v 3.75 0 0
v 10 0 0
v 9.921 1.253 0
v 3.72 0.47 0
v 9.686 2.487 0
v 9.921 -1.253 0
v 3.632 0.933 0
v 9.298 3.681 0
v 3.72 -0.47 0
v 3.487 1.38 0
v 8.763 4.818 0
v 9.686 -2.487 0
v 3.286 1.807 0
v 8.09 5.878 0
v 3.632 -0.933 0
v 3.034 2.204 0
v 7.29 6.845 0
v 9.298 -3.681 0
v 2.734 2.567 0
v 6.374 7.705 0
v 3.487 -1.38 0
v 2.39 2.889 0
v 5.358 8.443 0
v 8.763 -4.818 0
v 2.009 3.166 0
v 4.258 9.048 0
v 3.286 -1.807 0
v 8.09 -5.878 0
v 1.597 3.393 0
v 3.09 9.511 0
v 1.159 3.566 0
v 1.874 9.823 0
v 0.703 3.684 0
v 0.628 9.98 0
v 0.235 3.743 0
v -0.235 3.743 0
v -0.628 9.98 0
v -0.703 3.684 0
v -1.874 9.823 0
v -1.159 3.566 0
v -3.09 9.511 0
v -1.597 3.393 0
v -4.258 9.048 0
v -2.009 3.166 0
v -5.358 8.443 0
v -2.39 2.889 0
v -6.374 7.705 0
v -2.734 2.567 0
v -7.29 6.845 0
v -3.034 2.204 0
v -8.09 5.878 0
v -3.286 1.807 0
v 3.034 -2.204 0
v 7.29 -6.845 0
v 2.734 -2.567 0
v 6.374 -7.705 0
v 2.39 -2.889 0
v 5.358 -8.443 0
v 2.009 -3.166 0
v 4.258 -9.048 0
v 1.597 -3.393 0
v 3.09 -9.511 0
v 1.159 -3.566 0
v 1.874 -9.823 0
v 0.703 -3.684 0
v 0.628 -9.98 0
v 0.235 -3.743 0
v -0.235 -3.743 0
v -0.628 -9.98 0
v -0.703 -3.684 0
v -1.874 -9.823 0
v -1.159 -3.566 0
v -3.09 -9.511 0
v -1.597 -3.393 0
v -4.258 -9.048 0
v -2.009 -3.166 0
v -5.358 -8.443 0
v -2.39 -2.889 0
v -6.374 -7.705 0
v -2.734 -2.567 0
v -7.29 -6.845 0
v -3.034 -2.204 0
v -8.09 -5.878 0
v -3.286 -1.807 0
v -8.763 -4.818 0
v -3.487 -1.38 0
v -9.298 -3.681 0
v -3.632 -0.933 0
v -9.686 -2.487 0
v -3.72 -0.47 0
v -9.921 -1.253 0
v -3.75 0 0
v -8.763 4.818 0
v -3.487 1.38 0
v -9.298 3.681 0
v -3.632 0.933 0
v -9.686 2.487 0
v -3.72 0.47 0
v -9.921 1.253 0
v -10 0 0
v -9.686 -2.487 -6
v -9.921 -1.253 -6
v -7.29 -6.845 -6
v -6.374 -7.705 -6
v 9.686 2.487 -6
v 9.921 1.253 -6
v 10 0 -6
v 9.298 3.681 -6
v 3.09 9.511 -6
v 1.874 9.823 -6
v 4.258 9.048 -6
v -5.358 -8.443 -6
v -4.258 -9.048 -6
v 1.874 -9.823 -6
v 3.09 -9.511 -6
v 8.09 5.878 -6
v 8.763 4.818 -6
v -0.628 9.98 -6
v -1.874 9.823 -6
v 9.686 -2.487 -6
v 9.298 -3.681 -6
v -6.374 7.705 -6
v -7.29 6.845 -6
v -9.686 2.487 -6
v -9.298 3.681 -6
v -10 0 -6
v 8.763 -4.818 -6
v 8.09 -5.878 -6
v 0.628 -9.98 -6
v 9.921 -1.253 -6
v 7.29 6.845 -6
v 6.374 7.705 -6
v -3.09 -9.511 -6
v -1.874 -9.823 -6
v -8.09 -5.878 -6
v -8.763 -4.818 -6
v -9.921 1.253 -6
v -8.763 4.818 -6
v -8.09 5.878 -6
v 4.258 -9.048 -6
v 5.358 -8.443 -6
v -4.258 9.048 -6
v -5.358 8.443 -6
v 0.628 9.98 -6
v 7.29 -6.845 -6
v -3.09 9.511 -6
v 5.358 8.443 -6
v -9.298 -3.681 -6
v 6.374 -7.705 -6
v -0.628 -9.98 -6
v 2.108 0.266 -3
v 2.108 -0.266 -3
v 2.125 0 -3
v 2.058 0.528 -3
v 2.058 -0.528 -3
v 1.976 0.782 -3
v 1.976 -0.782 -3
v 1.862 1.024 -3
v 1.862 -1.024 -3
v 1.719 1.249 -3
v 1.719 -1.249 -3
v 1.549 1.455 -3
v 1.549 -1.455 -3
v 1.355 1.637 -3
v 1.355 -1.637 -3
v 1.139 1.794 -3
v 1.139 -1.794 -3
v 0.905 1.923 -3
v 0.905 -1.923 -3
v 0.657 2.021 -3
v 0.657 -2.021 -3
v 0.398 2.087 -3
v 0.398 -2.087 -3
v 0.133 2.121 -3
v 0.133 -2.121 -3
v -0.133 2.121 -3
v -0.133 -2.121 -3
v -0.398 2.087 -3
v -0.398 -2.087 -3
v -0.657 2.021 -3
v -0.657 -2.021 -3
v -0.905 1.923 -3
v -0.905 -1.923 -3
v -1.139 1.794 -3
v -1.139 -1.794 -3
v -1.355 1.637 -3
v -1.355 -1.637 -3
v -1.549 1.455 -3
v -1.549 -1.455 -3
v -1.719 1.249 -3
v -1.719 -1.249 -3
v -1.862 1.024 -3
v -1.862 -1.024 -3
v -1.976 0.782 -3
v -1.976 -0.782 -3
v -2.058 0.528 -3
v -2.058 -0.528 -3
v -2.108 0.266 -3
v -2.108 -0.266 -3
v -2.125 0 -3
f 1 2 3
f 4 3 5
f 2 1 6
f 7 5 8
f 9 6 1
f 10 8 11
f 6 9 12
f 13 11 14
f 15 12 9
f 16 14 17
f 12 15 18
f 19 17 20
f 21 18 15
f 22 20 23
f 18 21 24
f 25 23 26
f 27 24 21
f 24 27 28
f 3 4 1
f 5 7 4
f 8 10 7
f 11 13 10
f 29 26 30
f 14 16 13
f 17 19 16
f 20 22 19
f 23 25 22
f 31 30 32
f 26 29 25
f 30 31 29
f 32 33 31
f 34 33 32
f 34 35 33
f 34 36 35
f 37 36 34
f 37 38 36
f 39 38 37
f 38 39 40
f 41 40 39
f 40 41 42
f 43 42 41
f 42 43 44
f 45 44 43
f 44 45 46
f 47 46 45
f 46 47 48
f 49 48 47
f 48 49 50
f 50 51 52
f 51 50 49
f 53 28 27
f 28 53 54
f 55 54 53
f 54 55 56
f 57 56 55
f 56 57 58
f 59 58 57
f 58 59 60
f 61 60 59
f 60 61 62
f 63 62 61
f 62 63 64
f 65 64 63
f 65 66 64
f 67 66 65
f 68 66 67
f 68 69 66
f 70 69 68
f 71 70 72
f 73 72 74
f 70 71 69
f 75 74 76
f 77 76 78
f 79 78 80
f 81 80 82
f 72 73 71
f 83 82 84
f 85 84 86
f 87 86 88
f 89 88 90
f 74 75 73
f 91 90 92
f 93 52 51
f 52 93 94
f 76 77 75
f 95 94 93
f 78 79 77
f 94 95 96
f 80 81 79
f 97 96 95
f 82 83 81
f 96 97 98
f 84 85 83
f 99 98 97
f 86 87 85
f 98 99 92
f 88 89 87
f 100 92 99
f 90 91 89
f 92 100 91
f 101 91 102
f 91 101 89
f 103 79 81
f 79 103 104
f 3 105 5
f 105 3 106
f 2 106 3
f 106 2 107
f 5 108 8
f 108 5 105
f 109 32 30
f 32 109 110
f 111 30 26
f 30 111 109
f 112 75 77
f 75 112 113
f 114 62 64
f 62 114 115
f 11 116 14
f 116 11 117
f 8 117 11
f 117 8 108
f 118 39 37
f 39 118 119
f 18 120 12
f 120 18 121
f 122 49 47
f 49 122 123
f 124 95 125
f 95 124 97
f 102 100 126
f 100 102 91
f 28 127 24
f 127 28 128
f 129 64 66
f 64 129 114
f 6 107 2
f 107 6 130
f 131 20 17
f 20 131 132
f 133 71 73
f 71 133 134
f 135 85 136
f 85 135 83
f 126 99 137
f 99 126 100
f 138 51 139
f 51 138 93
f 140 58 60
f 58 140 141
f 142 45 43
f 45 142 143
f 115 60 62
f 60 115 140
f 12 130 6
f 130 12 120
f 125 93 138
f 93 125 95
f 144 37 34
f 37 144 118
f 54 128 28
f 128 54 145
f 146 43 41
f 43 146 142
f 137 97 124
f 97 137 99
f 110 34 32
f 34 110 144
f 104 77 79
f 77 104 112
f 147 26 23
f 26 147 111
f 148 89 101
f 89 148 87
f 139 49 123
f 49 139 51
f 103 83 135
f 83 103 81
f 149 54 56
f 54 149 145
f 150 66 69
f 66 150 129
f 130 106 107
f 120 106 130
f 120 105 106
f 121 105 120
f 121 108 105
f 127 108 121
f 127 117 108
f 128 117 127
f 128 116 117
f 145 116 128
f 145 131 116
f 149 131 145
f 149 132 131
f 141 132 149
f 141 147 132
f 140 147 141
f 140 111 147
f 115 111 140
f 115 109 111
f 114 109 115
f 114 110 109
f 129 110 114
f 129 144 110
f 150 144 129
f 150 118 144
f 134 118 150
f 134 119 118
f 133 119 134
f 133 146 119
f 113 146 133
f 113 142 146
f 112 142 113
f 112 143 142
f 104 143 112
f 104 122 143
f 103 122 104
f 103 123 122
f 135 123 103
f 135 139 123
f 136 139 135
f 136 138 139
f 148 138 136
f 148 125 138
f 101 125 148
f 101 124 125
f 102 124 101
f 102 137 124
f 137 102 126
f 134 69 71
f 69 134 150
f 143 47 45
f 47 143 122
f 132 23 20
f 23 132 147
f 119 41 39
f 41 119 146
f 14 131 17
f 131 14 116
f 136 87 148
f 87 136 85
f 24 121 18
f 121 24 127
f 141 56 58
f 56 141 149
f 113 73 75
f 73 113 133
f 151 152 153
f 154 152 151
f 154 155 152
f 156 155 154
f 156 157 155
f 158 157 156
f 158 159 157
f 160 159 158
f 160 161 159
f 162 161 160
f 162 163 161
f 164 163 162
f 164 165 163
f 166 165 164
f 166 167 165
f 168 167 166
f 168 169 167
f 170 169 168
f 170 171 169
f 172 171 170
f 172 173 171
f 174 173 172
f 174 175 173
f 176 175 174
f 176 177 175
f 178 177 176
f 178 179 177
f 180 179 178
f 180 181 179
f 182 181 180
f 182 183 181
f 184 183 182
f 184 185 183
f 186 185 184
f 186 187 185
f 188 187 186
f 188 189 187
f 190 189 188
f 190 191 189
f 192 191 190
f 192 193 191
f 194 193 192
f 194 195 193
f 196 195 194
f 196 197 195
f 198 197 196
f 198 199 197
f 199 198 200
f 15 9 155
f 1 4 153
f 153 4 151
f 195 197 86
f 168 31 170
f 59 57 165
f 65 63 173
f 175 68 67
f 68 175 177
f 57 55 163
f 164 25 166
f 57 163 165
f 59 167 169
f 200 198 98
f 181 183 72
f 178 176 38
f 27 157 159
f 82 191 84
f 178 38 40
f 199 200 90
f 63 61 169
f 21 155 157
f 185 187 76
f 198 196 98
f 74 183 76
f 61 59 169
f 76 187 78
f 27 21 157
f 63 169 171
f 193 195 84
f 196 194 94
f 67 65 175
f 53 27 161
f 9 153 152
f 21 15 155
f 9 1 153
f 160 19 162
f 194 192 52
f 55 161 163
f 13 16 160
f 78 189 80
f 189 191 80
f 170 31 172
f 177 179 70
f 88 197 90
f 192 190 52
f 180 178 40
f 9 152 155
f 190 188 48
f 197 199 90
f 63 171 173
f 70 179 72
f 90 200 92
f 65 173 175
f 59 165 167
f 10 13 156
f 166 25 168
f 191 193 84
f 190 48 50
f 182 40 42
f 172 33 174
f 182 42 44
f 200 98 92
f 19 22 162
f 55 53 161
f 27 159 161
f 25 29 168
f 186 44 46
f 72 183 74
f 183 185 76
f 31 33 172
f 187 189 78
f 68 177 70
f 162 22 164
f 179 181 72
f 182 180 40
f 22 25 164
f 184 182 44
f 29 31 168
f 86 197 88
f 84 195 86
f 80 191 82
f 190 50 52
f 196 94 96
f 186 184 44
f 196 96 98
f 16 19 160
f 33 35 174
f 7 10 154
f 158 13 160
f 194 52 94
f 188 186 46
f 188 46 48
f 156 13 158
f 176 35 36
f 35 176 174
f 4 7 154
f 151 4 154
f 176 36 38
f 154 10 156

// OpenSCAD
$fn = 50;


difference() {
	union() {
		translate(v = [0, 0, -3.0000000000]) {
			cylinder(h = 3, r = 7.0000000000);
		}
		translate(v = [0, 0, -6.0000000000]) {
			cylinder(h = 6, r = 10.0000000000);
		}
	}
	union() {
		translate(v = [0, 0, 0]) {
			rotate(a = [0, 0, 0]) {
				difference() {
					union() {
						#translate(v = [0, 0, -3.0000000000]) {
							cylinder(h = 3, r = 2.0000000000);
						}
						#translate(v = [0, 0, -3]) {
							cylinder(h = 3, r = 7.0000000000, r1 = 2.1250000000, r2 = 3.7500000000);
						}
						#translate(v = [0, 0, -3.0000000000]) {
							cylinder(h = 3, r = 2.1250000000);
						}
						#translate(v = [0, 0, -3.0000000000]) {
							cylinder(h = 3, r = 2.0000000000);
						}
					}
					union();
				}
			}
		}
	}
}
